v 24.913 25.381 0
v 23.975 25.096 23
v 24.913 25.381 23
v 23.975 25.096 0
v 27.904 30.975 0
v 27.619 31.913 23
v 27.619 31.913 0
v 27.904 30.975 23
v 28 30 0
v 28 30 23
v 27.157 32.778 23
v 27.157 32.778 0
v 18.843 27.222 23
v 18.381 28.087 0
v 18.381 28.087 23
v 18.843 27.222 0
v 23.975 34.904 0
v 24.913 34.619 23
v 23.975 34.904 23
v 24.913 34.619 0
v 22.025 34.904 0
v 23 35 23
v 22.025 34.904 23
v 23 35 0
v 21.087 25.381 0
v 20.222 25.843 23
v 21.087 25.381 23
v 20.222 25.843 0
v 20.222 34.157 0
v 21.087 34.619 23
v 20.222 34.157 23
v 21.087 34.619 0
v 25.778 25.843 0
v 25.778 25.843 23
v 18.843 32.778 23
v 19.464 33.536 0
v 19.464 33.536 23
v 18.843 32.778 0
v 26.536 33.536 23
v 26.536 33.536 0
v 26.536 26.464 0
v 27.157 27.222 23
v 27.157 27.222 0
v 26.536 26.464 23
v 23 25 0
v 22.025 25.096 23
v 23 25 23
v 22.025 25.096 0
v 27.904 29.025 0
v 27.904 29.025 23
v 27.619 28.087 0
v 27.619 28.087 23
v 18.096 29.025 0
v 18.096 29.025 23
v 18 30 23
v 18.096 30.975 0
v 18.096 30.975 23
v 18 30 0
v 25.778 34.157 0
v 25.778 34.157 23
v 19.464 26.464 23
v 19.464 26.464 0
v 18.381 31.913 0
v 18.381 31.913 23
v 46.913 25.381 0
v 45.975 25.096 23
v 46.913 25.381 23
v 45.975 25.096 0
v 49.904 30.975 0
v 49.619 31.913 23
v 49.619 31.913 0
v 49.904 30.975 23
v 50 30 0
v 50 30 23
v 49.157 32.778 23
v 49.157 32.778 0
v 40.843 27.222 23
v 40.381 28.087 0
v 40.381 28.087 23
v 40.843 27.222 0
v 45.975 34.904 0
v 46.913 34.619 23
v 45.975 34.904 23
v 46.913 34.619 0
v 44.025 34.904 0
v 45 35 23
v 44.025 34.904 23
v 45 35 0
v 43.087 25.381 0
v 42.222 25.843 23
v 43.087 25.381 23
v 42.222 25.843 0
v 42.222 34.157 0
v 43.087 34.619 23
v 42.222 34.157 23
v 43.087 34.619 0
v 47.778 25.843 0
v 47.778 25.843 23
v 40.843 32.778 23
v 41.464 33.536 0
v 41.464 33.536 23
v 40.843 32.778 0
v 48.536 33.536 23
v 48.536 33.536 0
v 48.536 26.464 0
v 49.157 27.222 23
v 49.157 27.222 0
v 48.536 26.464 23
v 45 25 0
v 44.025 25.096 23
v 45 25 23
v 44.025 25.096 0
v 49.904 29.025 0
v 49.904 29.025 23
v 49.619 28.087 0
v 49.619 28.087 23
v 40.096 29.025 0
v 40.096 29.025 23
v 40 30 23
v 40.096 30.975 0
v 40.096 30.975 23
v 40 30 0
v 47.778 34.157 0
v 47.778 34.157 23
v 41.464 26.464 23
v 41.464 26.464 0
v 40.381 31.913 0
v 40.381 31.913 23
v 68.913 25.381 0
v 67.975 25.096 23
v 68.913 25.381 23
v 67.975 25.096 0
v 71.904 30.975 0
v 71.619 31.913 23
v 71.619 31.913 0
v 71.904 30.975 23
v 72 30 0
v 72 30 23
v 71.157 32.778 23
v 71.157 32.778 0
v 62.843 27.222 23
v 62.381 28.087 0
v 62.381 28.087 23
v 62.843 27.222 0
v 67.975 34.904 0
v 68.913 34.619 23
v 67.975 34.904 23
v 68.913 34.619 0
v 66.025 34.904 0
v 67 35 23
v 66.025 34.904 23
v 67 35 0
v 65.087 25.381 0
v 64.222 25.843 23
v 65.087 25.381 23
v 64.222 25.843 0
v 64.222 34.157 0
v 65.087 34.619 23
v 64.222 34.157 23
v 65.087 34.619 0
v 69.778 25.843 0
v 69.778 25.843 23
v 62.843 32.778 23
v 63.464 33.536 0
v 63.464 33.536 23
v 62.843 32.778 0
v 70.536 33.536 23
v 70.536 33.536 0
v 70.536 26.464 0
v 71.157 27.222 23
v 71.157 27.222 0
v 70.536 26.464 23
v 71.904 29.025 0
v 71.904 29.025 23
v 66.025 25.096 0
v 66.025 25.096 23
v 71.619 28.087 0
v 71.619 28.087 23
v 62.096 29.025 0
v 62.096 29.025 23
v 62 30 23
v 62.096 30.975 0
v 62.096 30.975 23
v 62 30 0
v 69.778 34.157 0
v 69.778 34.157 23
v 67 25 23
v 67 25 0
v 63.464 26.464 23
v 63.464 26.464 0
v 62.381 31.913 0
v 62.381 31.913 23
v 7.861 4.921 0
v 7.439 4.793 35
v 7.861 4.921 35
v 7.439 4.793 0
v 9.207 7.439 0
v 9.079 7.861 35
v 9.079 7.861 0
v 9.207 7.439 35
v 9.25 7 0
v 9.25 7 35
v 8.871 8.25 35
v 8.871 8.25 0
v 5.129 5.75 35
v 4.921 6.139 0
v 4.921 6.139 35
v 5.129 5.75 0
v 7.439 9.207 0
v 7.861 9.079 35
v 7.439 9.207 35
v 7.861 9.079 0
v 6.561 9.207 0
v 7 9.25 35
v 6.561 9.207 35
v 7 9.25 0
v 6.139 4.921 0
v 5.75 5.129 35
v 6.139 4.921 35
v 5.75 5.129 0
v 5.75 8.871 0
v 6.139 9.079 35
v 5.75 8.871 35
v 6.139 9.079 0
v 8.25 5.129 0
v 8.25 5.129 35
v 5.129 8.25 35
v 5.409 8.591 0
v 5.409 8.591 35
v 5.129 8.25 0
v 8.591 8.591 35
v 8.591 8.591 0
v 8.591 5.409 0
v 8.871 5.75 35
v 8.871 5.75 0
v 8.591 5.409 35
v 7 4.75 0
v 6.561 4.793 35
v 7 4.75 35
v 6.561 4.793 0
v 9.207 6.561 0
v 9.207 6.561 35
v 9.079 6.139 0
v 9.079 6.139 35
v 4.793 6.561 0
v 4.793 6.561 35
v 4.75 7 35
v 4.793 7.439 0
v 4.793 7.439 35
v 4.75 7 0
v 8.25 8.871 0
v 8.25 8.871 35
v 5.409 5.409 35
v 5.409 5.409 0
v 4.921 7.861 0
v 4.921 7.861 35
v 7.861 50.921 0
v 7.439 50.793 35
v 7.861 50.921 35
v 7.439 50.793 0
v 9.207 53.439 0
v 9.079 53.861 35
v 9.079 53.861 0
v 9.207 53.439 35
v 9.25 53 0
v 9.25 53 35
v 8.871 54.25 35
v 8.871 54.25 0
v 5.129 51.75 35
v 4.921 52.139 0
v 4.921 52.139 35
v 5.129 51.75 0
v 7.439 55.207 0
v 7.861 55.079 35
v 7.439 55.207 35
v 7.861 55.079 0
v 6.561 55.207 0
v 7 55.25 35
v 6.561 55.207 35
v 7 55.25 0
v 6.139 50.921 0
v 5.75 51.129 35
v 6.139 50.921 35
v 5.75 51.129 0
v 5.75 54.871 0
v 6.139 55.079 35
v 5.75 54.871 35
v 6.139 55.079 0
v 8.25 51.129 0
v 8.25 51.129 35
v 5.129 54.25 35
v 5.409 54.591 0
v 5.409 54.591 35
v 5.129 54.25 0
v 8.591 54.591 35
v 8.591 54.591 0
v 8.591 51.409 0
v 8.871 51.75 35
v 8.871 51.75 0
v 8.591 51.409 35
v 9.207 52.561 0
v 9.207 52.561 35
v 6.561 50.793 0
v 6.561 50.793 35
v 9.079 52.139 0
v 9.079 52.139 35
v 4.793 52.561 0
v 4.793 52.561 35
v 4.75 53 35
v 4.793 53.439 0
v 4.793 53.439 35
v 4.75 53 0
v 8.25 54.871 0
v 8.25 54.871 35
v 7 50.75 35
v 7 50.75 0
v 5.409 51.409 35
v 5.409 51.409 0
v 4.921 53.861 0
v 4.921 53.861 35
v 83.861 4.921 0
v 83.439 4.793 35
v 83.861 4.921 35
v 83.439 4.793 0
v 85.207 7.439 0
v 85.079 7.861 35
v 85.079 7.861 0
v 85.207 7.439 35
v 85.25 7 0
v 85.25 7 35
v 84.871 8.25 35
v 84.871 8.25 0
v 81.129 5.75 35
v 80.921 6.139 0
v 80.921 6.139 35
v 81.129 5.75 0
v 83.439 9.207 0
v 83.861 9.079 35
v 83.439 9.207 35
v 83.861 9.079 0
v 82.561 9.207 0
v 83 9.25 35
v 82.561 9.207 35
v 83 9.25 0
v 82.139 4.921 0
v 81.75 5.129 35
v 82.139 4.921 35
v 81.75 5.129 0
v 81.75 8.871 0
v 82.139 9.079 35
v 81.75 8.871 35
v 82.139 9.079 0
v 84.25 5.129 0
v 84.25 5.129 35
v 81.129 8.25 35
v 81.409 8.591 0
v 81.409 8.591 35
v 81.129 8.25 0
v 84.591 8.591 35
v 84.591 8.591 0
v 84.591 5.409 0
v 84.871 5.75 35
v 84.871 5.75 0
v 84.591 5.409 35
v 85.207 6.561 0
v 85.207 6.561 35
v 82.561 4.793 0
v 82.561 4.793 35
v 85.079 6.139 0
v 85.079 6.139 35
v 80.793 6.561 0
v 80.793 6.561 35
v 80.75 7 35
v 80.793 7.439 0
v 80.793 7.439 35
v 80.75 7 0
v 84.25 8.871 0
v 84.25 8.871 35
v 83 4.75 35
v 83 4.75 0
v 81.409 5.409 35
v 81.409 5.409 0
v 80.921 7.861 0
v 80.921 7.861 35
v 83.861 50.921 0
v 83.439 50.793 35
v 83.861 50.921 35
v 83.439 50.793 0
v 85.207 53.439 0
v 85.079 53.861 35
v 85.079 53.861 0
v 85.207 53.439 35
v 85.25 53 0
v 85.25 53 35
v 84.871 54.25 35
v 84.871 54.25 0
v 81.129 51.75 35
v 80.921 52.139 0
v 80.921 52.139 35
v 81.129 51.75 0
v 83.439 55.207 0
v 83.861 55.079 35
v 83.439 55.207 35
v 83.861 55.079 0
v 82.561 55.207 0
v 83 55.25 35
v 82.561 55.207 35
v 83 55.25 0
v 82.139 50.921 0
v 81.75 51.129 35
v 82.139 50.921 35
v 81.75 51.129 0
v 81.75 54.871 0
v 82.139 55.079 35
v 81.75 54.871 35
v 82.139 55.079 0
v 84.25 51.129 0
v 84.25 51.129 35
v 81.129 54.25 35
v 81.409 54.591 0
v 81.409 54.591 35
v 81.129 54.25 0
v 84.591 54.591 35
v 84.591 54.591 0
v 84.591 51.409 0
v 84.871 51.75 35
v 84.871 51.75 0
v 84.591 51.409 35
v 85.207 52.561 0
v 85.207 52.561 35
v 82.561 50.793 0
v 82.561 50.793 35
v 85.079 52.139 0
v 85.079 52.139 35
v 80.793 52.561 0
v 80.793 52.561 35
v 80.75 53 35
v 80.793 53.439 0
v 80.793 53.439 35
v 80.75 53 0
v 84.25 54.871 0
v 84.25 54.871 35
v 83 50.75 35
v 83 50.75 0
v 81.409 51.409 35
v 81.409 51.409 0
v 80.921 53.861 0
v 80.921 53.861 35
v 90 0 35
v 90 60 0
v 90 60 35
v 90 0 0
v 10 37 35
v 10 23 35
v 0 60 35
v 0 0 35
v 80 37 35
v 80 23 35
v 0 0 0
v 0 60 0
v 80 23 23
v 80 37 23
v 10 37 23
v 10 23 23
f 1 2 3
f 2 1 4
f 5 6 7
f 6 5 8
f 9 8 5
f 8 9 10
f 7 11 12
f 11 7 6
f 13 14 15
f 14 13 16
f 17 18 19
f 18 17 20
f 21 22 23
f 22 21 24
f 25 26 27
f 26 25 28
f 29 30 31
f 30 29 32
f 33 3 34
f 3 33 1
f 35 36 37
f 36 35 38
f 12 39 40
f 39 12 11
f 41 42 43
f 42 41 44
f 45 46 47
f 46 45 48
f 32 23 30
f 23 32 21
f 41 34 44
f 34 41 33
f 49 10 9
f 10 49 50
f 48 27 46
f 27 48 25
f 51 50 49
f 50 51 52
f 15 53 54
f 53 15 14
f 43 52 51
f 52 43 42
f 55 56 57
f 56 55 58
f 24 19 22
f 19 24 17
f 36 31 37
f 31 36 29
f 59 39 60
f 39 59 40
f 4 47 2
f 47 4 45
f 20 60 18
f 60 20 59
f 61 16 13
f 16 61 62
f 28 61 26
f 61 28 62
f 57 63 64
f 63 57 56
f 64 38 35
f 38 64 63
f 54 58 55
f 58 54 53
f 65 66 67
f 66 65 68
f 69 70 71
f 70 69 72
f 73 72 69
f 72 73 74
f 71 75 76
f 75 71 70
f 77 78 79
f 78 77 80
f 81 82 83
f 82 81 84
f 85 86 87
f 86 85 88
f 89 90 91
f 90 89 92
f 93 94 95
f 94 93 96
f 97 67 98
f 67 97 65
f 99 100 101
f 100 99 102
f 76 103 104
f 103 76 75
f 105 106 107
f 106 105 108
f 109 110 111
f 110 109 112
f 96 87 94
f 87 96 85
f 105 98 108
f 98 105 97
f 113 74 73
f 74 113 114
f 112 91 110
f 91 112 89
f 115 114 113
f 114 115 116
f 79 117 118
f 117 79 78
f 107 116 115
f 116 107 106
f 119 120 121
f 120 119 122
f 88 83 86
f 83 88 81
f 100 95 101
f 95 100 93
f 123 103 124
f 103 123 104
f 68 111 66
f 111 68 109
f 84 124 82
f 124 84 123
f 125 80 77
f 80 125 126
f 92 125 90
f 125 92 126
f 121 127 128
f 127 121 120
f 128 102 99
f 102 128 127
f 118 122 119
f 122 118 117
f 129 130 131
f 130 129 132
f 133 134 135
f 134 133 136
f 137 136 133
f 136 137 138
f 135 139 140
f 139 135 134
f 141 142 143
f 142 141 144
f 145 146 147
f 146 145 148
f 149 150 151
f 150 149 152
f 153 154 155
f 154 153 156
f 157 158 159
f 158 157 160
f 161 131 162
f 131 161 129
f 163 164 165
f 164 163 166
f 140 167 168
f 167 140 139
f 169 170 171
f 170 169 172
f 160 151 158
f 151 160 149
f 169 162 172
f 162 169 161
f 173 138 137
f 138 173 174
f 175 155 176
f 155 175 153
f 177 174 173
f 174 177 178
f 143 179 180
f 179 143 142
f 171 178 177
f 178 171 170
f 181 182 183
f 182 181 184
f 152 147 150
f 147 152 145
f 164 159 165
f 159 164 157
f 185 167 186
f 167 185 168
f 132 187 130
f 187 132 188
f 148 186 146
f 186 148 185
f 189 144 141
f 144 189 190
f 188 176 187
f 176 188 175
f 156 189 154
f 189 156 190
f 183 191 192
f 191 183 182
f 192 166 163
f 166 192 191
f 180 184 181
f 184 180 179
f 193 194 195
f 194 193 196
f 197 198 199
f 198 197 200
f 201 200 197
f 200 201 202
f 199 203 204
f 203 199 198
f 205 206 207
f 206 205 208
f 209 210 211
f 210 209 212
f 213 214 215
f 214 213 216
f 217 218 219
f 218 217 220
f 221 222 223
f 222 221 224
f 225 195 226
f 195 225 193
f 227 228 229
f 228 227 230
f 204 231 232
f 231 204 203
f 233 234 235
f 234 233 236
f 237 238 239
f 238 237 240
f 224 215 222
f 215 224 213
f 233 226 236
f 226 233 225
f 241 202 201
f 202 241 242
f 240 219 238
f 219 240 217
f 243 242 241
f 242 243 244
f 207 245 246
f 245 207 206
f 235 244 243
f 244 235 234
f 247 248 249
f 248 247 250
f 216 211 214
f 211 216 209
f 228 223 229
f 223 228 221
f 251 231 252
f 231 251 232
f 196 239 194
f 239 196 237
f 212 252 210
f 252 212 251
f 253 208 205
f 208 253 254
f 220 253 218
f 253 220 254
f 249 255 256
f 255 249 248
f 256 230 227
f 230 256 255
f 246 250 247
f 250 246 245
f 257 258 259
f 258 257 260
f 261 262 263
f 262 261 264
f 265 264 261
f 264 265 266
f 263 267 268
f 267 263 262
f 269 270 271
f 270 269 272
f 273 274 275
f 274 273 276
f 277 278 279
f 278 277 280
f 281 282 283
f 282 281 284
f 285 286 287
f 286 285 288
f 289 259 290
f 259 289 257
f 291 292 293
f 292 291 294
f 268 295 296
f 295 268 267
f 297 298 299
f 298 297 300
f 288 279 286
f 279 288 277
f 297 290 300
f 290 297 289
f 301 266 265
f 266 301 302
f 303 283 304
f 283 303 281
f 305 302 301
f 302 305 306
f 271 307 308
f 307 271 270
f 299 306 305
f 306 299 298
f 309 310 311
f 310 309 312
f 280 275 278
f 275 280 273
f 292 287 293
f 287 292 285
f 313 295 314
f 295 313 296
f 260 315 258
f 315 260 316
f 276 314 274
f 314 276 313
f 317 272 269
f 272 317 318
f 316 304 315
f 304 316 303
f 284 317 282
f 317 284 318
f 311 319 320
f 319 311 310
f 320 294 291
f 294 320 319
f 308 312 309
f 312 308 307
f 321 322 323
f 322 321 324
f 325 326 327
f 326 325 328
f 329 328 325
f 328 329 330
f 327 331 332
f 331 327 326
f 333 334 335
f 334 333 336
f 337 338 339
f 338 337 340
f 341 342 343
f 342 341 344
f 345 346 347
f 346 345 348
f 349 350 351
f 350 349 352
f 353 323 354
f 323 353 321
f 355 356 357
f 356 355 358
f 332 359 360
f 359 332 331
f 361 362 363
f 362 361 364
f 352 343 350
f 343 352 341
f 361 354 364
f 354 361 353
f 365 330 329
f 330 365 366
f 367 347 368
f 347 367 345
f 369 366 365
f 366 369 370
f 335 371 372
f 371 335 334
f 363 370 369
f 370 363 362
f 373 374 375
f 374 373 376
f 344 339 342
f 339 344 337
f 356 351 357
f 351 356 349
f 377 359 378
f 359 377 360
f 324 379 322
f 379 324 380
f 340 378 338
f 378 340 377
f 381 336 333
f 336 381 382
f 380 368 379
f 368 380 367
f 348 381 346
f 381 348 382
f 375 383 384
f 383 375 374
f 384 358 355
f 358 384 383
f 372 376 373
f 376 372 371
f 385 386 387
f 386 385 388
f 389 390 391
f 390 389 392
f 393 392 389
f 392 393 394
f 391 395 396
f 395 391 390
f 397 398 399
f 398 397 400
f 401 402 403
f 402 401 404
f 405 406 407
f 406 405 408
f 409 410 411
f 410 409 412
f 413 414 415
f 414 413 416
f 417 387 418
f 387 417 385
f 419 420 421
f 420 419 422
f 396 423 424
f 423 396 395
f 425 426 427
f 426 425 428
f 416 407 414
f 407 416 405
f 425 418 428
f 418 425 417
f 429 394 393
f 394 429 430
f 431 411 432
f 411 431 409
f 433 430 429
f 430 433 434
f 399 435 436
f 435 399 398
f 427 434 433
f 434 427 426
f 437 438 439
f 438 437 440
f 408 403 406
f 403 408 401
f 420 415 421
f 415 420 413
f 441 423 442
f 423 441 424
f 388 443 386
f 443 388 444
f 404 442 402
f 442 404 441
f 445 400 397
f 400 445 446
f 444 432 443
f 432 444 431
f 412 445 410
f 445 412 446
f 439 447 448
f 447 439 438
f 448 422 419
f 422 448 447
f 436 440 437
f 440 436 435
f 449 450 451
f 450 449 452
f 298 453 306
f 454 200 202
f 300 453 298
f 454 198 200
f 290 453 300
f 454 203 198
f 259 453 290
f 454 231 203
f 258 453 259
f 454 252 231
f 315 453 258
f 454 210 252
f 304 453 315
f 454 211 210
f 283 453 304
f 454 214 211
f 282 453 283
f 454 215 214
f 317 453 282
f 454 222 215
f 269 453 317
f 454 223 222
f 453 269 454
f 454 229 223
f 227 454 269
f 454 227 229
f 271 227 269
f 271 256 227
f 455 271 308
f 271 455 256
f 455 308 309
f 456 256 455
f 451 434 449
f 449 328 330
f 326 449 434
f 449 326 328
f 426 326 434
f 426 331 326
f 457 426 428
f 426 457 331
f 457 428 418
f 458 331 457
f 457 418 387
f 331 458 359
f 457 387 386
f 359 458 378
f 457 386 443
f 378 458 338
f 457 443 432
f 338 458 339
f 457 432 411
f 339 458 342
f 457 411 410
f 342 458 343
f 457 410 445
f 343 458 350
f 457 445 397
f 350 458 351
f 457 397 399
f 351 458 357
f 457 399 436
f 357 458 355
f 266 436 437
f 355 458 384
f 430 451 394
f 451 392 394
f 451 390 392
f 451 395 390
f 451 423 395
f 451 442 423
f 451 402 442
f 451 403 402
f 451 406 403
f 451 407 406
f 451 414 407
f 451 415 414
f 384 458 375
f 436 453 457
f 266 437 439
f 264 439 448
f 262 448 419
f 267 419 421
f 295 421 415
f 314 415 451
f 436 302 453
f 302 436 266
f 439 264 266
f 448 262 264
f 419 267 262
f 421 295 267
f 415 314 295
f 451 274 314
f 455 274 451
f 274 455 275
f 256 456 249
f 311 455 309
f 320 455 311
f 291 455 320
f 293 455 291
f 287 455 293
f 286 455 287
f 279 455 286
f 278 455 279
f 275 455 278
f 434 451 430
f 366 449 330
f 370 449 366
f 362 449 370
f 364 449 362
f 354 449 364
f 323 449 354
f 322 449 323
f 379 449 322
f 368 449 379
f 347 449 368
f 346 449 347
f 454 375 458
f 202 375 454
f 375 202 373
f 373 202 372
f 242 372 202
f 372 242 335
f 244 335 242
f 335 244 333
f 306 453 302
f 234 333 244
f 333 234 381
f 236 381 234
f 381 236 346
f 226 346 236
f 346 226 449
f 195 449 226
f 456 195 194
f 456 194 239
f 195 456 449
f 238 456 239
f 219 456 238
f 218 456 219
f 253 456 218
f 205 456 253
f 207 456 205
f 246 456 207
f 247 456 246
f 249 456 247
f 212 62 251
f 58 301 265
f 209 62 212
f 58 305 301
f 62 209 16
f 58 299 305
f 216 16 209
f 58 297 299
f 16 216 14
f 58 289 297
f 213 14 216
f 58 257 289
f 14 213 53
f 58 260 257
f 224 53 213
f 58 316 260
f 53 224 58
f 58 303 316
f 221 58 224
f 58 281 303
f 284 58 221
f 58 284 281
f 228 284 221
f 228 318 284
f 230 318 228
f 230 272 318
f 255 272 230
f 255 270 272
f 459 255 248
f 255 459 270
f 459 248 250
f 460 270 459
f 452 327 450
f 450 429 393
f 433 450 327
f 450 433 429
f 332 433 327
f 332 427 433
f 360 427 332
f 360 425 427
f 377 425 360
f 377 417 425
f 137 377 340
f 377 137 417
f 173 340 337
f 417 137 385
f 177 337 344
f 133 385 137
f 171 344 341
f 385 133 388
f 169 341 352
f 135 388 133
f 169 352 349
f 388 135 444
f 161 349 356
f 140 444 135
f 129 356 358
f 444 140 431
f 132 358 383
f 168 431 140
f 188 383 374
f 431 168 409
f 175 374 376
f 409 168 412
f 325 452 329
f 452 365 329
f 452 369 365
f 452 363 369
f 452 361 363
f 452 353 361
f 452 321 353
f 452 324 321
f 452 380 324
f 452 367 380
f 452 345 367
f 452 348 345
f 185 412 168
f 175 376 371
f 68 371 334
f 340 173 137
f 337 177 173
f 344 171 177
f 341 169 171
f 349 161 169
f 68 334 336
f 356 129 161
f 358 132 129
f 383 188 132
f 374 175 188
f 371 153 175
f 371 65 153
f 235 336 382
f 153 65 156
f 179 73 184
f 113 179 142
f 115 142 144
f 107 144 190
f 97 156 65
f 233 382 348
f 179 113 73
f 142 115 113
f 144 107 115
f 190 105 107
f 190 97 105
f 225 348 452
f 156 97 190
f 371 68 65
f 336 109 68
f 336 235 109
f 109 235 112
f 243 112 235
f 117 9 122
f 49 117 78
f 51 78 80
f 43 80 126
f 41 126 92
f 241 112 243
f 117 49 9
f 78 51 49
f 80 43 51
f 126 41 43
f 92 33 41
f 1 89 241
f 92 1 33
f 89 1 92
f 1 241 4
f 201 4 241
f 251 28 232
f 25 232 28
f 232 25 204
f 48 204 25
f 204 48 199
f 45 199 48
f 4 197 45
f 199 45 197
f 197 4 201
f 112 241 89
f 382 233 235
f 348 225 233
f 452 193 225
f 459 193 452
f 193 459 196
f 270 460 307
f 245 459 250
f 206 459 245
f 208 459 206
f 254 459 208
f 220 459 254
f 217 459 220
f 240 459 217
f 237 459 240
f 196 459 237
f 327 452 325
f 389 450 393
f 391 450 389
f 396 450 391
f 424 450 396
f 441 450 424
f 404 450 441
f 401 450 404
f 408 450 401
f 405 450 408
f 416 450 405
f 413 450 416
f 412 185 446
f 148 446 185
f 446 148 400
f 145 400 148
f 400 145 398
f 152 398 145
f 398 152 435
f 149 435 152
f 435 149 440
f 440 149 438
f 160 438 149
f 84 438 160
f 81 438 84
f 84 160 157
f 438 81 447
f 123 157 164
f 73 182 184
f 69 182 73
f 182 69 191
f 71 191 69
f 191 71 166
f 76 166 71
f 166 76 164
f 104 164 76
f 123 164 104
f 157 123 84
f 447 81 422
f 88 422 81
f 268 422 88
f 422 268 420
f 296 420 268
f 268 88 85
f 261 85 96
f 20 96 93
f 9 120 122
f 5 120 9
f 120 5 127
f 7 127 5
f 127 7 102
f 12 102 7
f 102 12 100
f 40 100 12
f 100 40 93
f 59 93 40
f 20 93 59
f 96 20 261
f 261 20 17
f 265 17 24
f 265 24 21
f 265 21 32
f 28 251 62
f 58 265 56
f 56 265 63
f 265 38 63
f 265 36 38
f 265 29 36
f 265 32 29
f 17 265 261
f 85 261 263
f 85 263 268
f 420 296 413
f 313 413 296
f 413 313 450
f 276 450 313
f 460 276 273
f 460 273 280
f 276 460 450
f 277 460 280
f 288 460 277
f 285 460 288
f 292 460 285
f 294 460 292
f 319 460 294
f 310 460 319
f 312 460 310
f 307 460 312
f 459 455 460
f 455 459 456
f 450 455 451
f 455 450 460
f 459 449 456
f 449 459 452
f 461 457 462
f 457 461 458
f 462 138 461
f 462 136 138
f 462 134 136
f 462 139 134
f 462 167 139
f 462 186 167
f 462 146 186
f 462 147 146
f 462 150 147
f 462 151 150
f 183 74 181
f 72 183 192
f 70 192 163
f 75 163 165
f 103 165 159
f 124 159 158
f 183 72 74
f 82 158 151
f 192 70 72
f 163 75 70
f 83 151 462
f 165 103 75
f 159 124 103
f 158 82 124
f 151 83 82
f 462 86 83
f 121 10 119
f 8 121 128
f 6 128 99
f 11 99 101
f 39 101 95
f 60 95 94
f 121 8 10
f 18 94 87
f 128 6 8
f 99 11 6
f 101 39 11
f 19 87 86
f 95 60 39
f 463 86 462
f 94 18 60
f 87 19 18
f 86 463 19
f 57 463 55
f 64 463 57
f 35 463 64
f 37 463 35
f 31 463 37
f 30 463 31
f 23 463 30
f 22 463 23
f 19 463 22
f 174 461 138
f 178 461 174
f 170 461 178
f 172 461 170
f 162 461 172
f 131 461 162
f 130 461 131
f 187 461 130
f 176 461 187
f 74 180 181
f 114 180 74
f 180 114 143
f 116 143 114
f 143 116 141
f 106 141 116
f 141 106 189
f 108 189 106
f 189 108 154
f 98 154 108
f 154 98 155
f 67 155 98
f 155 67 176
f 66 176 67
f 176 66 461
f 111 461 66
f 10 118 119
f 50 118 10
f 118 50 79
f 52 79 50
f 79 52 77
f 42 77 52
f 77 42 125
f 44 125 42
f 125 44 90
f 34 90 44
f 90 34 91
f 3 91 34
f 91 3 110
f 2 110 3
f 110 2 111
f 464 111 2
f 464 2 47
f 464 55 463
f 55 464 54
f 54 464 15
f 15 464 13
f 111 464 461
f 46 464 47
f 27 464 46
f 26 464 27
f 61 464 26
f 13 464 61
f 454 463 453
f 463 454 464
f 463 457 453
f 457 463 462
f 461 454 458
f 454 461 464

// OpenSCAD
$fn = 32;

// ----------------------------------------------------------------------
// Manifold block: gallery_top manifold
// ----------------------------------------------------------------------

// --- parameters (mm) ---
block_l = 90;             // block length, X
block_w = 60;             // block width, Y
block_h = 35;             // block height, Z
port_d = 10;              // port bore diameter
port_pitch = 22;          // port pitch along X
gallery_d = 14;           // top gallery width, Y
gallery_depth = 12;       // gallery pocket depth
wall_p = 10;              // gallery end wall thickness, X
mnt_d = 4.5;              // mounting hole diameter
mnt_in = 7;               // mounting hole inset from the edges

n_ports = 3;  // ports in the row
port_x0 = (block_l - (n_ports - 1) * port_pitch) / 2;  // first port X

difference() {
  cube([block_l, block_w, block_h]);
  for (i = [0 : n_ports - 1])
    translate([port_x0 + i * port_pitch, block_w / 2, -1])
      cylinder(h = block_h + 2, d = port_d);
  translate([wall_p, block_w / 2 - gallery_d / 2, block_h - gallery_depth])
    cube([block_l - 2 * wall_p, gallery_d, gallery_depth + 1]);
  for (cx = [mnt_in, block_l - mnt_in])
    for (cy = [mnt_in, block_w - mnt_in])
      translate([cx, cy, -1]) cylinder(h = block_h + 2, d = mnt_d);
}
